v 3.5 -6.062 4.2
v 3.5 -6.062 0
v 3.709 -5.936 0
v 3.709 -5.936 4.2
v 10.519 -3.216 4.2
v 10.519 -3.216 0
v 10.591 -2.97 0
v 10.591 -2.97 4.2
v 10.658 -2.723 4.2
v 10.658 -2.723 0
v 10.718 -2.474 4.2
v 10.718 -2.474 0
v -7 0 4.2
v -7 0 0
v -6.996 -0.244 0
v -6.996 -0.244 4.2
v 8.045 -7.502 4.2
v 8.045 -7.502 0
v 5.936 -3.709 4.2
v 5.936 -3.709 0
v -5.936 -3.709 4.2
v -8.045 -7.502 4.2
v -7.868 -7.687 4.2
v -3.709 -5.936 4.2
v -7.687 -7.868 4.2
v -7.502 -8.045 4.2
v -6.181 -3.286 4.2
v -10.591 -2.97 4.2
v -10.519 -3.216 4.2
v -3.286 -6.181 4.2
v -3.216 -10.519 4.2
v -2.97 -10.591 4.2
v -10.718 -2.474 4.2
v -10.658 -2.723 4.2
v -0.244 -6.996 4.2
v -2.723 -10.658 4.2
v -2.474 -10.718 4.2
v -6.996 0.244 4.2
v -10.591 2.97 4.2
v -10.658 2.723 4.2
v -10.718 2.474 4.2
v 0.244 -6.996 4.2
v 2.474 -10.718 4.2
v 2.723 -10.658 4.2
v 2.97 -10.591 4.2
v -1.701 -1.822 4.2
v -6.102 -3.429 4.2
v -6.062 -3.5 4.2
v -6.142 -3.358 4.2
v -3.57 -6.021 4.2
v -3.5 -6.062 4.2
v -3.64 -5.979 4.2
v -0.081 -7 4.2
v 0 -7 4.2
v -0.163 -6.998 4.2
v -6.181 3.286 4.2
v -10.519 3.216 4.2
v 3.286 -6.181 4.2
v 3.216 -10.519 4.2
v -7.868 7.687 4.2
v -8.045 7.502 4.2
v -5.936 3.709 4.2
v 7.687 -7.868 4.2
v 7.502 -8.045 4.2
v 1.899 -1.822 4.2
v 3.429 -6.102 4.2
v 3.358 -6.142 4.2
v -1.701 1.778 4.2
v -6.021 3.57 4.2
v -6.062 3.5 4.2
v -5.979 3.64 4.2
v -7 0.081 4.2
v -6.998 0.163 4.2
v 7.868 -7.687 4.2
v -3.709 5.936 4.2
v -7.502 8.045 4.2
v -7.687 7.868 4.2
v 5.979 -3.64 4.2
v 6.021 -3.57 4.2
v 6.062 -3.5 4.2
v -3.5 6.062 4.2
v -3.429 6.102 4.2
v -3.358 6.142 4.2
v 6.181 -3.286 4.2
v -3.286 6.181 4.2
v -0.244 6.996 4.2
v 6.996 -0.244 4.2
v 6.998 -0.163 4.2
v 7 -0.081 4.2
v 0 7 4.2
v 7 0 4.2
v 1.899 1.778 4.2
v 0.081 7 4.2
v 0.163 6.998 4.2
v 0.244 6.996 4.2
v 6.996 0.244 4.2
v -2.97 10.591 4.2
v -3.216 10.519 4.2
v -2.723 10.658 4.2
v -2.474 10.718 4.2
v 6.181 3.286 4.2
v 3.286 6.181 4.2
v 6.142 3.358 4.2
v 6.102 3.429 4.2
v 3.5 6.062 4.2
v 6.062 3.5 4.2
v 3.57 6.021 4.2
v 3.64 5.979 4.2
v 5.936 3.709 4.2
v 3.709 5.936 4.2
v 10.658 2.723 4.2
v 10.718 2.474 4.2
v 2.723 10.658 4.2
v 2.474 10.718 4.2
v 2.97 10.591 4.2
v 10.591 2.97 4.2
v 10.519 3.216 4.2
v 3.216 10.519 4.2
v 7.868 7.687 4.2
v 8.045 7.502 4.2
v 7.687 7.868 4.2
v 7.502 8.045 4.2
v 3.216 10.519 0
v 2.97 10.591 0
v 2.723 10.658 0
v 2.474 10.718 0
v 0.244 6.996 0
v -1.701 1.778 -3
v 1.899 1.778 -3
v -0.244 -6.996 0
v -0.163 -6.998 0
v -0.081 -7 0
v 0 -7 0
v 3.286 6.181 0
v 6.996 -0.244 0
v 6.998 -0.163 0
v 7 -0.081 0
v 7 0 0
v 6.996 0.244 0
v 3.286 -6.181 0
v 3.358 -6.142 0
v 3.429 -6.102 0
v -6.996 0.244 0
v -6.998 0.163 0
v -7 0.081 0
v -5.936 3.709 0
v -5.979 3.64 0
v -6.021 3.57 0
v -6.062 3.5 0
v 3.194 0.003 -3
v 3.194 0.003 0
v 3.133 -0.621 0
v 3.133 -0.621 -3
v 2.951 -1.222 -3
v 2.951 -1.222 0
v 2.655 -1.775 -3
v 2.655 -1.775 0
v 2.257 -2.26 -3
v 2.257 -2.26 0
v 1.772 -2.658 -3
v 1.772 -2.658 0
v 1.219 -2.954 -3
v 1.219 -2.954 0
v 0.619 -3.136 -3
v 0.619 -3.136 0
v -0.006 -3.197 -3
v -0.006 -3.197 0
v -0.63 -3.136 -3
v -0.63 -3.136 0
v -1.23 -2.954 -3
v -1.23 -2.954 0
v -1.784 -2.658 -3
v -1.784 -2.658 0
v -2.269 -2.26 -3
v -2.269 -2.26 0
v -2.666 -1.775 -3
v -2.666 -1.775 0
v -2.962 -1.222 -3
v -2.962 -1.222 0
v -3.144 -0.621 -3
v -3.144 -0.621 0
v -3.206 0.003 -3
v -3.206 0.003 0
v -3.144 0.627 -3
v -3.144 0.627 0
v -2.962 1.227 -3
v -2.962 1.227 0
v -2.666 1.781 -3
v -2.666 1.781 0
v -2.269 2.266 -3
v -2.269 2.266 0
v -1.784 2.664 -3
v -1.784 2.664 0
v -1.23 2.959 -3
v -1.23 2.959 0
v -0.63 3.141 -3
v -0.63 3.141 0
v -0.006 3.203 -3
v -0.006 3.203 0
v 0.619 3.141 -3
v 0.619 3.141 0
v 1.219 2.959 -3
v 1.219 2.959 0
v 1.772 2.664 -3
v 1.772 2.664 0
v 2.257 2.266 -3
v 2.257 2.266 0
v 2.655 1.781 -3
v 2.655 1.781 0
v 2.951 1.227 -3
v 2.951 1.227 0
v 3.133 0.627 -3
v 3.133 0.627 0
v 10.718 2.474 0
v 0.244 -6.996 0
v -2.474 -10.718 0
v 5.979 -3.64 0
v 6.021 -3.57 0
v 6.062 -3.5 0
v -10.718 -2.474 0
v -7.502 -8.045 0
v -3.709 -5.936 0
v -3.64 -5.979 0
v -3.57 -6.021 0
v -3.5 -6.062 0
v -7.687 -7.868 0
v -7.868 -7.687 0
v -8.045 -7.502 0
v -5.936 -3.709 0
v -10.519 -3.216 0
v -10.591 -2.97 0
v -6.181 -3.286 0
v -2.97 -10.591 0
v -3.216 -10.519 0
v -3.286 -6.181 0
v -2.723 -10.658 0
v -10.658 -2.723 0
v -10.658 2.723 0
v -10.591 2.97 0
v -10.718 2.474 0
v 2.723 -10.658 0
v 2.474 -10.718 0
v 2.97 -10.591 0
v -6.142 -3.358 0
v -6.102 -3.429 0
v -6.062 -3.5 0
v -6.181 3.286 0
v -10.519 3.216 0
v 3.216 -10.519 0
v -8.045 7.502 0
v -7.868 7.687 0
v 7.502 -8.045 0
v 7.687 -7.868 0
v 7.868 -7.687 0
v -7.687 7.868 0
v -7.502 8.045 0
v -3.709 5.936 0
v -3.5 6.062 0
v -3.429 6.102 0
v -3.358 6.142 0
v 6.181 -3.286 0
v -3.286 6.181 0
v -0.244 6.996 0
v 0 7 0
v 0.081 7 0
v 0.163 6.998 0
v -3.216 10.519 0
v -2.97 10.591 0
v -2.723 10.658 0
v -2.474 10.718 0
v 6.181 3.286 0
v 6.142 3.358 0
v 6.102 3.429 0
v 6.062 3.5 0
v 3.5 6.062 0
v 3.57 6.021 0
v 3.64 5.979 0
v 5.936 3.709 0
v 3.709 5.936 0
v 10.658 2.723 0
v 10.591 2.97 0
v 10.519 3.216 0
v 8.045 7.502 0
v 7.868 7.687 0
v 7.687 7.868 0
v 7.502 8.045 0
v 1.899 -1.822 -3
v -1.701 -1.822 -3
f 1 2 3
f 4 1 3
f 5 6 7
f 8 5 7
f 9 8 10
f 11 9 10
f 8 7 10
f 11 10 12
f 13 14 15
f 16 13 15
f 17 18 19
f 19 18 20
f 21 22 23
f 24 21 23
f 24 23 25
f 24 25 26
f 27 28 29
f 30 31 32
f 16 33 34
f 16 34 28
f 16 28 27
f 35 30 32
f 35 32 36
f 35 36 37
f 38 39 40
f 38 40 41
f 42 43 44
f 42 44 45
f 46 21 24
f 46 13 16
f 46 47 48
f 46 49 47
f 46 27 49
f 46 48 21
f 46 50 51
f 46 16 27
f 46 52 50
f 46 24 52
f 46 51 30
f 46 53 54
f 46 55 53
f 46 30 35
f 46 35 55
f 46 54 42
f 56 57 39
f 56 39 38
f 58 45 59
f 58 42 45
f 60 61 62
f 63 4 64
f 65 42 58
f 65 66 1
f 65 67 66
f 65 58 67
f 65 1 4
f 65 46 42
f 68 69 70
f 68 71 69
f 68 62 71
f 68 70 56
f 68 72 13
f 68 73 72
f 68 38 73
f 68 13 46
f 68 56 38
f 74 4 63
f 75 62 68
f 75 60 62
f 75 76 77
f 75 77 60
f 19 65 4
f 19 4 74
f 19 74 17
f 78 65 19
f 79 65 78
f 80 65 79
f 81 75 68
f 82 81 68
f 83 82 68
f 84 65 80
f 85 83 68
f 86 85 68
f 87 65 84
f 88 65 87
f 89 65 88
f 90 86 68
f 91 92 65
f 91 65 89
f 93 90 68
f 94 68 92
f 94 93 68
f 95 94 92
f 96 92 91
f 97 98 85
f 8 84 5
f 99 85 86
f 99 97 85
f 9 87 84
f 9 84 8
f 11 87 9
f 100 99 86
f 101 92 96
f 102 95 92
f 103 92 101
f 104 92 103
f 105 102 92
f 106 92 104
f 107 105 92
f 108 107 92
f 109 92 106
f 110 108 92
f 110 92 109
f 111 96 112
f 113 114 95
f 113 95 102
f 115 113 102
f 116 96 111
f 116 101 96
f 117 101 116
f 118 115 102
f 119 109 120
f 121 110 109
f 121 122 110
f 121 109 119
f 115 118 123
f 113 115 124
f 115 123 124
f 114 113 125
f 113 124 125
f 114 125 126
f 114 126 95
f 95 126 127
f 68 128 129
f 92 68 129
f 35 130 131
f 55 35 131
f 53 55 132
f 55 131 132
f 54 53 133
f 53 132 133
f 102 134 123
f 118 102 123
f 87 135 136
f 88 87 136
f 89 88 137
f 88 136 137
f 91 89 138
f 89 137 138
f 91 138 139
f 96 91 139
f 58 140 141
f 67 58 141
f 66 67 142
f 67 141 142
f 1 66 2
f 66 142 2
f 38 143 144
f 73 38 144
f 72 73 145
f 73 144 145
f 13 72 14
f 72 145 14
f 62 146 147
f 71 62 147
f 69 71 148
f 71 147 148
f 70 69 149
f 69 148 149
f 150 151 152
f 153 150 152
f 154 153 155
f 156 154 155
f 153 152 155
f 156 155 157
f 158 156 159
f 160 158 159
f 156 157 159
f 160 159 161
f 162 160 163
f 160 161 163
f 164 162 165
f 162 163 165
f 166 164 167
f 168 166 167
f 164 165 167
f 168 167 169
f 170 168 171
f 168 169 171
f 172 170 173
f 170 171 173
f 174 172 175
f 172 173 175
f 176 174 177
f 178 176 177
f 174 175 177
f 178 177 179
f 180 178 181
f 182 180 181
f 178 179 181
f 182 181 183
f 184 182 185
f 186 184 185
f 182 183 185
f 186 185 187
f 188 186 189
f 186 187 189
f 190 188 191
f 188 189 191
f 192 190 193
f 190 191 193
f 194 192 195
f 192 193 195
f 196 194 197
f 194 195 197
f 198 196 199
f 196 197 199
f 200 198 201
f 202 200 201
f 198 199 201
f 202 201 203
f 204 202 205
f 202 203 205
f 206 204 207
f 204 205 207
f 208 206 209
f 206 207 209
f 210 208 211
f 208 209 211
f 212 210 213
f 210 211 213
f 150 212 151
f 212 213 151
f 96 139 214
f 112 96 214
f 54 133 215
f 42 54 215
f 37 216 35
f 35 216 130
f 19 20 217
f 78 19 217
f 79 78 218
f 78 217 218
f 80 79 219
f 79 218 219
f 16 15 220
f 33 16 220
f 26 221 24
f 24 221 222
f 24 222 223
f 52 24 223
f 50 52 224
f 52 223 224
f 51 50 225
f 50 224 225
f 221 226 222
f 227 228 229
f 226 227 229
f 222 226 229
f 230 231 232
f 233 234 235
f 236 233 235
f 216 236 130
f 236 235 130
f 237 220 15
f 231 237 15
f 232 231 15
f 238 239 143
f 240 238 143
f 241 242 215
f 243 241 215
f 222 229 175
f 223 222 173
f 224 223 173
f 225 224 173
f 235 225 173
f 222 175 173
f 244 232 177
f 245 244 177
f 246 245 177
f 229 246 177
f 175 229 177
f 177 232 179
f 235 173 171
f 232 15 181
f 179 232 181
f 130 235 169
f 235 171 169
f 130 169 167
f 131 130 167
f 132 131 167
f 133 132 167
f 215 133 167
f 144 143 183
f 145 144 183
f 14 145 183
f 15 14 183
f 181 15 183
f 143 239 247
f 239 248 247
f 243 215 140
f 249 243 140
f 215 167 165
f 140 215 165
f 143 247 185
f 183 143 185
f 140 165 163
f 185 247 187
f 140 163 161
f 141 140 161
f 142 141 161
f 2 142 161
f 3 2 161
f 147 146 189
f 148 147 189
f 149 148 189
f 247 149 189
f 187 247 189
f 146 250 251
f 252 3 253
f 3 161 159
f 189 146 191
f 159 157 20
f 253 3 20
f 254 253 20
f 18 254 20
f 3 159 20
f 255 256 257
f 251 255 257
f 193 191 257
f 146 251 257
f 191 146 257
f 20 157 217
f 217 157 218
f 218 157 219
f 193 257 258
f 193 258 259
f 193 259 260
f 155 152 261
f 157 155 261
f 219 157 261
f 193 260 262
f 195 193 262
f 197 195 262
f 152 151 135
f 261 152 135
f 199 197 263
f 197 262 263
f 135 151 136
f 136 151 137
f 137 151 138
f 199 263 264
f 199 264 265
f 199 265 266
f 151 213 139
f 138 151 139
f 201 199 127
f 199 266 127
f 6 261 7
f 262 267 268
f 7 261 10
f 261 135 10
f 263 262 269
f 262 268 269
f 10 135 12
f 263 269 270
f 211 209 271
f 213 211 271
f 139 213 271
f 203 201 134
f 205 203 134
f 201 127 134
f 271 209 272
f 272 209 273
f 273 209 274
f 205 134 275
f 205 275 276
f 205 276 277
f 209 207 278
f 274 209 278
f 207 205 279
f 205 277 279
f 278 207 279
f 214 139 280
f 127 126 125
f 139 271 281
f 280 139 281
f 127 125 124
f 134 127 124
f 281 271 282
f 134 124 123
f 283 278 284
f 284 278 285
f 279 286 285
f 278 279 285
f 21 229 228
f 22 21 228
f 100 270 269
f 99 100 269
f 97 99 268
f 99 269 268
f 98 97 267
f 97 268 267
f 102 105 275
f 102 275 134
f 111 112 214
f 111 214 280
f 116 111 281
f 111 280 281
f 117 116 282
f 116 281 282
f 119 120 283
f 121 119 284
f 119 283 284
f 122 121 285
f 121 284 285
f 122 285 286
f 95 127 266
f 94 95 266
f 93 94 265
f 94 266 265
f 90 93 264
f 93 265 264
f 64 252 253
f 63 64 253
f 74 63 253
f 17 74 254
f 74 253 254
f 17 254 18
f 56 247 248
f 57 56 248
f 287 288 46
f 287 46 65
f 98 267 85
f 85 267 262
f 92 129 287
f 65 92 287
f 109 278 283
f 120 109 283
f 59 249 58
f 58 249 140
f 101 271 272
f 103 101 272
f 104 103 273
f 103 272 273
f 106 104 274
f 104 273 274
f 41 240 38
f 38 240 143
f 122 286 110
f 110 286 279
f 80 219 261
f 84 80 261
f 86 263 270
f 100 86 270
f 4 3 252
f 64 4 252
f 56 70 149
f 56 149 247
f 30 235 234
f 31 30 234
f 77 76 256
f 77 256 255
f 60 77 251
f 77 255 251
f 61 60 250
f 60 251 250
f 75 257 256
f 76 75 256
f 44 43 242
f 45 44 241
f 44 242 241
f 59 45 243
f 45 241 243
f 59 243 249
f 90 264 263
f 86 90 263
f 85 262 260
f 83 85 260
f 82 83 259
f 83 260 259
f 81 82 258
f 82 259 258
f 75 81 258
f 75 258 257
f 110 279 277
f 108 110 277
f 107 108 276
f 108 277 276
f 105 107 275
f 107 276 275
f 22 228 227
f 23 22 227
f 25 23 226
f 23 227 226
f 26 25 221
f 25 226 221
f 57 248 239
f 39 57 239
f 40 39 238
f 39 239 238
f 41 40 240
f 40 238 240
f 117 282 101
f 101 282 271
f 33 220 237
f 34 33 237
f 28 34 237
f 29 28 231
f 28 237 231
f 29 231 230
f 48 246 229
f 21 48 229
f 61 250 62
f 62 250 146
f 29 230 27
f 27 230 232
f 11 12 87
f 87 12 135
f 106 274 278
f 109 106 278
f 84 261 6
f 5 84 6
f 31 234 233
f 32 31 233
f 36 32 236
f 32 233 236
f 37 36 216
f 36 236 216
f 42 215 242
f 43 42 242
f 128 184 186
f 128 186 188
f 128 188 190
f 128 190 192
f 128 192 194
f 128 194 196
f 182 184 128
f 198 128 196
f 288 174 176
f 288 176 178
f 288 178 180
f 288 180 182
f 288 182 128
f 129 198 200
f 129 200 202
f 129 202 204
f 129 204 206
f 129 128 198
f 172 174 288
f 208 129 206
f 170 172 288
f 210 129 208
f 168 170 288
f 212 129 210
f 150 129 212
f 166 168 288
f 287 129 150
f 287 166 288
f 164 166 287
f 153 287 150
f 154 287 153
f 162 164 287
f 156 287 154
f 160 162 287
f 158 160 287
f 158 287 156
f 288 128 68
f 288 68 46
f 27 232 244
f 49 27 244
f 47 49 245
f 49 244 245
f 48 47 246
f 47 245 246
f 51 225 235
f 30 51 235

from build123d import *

# Parameters (mm, degrees)
F0_R            = 11
F1_DEPTH        = 4.2
F3_DEPTH        = 4.201
F3_COPIES_COUNT = 12
F5_R            = 3.2
F6_DEPTH        = 3
F7_W            = 3.6
F7_H            = 3.6
F8_DEPTH        = 7.201


# Not quite as in the source:
# - a pattern or mirror of a feature is missing from the dataset's text; its kind, count and spacing are read off the source's solid


with BuildPart() as f1:
    # F0 (on Top) → F1 (new body)
    with BuildSketch(Plane.XY):
        Circle(F0_R)
    extrude(amount=F1_DEPTH)

    # F2 (on face) → F3 (cut, through all)
    with BuildSketch(Plane(origin=(0, 0, 0), x_dir=(1, 0, 0), z_dir=(0, 0, -1))):
        with BuildLine():
            ThreePointArc((6.9957357891, 0.2442964769), (6.9989338661, 0.1221668451), (7, 0))
            Line((7, 0), (8.3441911265, 0))
            Line((8.3441911265, 0), (11, 0))
            ThreePointArc((11, 0), (10.9292904124, 1.2452353514), (10.7180707126, 2.4744615978))
            Line((10.7180707126, 2.4744615978), (6.9957357891, 0.2442964769))
        make_face()
        with BuildLine():
            Line((8.3441911265, 0), (7, 0))
            Line((7, 0), (6.9957357891, -0.2442964769))
            Line((6.9957357891, -0.2442964769), (10.7180707126, -2.4744615978))
            ThreePointArc((10.7180707126, -2.4744615978), (10.9292904124, -1.2452353514), (11, 0))
            Line((11, 0), (8.3441911265, 0))
        make_face()
    f3 = extrude(amount=-F3_DEPTH, mode=Mode.SUBTRACT)

    # F3_copies: F3 ×12 about axis
    f3_copies_axis = Axis((0, 0, 0), (0, 0, 1))
    for i in range(1, F3_COPIES_COUNT):
        add(f3.rotate(f3_copies_axis, i * 360 / F3_COPIES_COUNT), mode=Mode.SUBTRACT)

    # F5 (on face) → F6 (join)
    with BuildSketch(Plane(origin=(0, 0, 0), x_dir=(1, 0, 0), z_dir=(0, 0, -1))):
        with Locations((-0.0057600341, -0.0028142263)):
            Circle(F5_R)
    extrude(amount=F6_DEPTH)

    # F7 (on face) → F8 (cut, through all)
    with BuildSketch(Plane(origin=(0, 0, -3), x_dir=(1, 0, 0), z_dir=(0, 0, -1))):
        with Locations((0.0985847846, 0.0223461993)):
            Rectangle(F7_W, F7_H)
    extrude(amount=-F8_DEPTH, mode=Mode.SUBTRACT)


solid = f1.part
